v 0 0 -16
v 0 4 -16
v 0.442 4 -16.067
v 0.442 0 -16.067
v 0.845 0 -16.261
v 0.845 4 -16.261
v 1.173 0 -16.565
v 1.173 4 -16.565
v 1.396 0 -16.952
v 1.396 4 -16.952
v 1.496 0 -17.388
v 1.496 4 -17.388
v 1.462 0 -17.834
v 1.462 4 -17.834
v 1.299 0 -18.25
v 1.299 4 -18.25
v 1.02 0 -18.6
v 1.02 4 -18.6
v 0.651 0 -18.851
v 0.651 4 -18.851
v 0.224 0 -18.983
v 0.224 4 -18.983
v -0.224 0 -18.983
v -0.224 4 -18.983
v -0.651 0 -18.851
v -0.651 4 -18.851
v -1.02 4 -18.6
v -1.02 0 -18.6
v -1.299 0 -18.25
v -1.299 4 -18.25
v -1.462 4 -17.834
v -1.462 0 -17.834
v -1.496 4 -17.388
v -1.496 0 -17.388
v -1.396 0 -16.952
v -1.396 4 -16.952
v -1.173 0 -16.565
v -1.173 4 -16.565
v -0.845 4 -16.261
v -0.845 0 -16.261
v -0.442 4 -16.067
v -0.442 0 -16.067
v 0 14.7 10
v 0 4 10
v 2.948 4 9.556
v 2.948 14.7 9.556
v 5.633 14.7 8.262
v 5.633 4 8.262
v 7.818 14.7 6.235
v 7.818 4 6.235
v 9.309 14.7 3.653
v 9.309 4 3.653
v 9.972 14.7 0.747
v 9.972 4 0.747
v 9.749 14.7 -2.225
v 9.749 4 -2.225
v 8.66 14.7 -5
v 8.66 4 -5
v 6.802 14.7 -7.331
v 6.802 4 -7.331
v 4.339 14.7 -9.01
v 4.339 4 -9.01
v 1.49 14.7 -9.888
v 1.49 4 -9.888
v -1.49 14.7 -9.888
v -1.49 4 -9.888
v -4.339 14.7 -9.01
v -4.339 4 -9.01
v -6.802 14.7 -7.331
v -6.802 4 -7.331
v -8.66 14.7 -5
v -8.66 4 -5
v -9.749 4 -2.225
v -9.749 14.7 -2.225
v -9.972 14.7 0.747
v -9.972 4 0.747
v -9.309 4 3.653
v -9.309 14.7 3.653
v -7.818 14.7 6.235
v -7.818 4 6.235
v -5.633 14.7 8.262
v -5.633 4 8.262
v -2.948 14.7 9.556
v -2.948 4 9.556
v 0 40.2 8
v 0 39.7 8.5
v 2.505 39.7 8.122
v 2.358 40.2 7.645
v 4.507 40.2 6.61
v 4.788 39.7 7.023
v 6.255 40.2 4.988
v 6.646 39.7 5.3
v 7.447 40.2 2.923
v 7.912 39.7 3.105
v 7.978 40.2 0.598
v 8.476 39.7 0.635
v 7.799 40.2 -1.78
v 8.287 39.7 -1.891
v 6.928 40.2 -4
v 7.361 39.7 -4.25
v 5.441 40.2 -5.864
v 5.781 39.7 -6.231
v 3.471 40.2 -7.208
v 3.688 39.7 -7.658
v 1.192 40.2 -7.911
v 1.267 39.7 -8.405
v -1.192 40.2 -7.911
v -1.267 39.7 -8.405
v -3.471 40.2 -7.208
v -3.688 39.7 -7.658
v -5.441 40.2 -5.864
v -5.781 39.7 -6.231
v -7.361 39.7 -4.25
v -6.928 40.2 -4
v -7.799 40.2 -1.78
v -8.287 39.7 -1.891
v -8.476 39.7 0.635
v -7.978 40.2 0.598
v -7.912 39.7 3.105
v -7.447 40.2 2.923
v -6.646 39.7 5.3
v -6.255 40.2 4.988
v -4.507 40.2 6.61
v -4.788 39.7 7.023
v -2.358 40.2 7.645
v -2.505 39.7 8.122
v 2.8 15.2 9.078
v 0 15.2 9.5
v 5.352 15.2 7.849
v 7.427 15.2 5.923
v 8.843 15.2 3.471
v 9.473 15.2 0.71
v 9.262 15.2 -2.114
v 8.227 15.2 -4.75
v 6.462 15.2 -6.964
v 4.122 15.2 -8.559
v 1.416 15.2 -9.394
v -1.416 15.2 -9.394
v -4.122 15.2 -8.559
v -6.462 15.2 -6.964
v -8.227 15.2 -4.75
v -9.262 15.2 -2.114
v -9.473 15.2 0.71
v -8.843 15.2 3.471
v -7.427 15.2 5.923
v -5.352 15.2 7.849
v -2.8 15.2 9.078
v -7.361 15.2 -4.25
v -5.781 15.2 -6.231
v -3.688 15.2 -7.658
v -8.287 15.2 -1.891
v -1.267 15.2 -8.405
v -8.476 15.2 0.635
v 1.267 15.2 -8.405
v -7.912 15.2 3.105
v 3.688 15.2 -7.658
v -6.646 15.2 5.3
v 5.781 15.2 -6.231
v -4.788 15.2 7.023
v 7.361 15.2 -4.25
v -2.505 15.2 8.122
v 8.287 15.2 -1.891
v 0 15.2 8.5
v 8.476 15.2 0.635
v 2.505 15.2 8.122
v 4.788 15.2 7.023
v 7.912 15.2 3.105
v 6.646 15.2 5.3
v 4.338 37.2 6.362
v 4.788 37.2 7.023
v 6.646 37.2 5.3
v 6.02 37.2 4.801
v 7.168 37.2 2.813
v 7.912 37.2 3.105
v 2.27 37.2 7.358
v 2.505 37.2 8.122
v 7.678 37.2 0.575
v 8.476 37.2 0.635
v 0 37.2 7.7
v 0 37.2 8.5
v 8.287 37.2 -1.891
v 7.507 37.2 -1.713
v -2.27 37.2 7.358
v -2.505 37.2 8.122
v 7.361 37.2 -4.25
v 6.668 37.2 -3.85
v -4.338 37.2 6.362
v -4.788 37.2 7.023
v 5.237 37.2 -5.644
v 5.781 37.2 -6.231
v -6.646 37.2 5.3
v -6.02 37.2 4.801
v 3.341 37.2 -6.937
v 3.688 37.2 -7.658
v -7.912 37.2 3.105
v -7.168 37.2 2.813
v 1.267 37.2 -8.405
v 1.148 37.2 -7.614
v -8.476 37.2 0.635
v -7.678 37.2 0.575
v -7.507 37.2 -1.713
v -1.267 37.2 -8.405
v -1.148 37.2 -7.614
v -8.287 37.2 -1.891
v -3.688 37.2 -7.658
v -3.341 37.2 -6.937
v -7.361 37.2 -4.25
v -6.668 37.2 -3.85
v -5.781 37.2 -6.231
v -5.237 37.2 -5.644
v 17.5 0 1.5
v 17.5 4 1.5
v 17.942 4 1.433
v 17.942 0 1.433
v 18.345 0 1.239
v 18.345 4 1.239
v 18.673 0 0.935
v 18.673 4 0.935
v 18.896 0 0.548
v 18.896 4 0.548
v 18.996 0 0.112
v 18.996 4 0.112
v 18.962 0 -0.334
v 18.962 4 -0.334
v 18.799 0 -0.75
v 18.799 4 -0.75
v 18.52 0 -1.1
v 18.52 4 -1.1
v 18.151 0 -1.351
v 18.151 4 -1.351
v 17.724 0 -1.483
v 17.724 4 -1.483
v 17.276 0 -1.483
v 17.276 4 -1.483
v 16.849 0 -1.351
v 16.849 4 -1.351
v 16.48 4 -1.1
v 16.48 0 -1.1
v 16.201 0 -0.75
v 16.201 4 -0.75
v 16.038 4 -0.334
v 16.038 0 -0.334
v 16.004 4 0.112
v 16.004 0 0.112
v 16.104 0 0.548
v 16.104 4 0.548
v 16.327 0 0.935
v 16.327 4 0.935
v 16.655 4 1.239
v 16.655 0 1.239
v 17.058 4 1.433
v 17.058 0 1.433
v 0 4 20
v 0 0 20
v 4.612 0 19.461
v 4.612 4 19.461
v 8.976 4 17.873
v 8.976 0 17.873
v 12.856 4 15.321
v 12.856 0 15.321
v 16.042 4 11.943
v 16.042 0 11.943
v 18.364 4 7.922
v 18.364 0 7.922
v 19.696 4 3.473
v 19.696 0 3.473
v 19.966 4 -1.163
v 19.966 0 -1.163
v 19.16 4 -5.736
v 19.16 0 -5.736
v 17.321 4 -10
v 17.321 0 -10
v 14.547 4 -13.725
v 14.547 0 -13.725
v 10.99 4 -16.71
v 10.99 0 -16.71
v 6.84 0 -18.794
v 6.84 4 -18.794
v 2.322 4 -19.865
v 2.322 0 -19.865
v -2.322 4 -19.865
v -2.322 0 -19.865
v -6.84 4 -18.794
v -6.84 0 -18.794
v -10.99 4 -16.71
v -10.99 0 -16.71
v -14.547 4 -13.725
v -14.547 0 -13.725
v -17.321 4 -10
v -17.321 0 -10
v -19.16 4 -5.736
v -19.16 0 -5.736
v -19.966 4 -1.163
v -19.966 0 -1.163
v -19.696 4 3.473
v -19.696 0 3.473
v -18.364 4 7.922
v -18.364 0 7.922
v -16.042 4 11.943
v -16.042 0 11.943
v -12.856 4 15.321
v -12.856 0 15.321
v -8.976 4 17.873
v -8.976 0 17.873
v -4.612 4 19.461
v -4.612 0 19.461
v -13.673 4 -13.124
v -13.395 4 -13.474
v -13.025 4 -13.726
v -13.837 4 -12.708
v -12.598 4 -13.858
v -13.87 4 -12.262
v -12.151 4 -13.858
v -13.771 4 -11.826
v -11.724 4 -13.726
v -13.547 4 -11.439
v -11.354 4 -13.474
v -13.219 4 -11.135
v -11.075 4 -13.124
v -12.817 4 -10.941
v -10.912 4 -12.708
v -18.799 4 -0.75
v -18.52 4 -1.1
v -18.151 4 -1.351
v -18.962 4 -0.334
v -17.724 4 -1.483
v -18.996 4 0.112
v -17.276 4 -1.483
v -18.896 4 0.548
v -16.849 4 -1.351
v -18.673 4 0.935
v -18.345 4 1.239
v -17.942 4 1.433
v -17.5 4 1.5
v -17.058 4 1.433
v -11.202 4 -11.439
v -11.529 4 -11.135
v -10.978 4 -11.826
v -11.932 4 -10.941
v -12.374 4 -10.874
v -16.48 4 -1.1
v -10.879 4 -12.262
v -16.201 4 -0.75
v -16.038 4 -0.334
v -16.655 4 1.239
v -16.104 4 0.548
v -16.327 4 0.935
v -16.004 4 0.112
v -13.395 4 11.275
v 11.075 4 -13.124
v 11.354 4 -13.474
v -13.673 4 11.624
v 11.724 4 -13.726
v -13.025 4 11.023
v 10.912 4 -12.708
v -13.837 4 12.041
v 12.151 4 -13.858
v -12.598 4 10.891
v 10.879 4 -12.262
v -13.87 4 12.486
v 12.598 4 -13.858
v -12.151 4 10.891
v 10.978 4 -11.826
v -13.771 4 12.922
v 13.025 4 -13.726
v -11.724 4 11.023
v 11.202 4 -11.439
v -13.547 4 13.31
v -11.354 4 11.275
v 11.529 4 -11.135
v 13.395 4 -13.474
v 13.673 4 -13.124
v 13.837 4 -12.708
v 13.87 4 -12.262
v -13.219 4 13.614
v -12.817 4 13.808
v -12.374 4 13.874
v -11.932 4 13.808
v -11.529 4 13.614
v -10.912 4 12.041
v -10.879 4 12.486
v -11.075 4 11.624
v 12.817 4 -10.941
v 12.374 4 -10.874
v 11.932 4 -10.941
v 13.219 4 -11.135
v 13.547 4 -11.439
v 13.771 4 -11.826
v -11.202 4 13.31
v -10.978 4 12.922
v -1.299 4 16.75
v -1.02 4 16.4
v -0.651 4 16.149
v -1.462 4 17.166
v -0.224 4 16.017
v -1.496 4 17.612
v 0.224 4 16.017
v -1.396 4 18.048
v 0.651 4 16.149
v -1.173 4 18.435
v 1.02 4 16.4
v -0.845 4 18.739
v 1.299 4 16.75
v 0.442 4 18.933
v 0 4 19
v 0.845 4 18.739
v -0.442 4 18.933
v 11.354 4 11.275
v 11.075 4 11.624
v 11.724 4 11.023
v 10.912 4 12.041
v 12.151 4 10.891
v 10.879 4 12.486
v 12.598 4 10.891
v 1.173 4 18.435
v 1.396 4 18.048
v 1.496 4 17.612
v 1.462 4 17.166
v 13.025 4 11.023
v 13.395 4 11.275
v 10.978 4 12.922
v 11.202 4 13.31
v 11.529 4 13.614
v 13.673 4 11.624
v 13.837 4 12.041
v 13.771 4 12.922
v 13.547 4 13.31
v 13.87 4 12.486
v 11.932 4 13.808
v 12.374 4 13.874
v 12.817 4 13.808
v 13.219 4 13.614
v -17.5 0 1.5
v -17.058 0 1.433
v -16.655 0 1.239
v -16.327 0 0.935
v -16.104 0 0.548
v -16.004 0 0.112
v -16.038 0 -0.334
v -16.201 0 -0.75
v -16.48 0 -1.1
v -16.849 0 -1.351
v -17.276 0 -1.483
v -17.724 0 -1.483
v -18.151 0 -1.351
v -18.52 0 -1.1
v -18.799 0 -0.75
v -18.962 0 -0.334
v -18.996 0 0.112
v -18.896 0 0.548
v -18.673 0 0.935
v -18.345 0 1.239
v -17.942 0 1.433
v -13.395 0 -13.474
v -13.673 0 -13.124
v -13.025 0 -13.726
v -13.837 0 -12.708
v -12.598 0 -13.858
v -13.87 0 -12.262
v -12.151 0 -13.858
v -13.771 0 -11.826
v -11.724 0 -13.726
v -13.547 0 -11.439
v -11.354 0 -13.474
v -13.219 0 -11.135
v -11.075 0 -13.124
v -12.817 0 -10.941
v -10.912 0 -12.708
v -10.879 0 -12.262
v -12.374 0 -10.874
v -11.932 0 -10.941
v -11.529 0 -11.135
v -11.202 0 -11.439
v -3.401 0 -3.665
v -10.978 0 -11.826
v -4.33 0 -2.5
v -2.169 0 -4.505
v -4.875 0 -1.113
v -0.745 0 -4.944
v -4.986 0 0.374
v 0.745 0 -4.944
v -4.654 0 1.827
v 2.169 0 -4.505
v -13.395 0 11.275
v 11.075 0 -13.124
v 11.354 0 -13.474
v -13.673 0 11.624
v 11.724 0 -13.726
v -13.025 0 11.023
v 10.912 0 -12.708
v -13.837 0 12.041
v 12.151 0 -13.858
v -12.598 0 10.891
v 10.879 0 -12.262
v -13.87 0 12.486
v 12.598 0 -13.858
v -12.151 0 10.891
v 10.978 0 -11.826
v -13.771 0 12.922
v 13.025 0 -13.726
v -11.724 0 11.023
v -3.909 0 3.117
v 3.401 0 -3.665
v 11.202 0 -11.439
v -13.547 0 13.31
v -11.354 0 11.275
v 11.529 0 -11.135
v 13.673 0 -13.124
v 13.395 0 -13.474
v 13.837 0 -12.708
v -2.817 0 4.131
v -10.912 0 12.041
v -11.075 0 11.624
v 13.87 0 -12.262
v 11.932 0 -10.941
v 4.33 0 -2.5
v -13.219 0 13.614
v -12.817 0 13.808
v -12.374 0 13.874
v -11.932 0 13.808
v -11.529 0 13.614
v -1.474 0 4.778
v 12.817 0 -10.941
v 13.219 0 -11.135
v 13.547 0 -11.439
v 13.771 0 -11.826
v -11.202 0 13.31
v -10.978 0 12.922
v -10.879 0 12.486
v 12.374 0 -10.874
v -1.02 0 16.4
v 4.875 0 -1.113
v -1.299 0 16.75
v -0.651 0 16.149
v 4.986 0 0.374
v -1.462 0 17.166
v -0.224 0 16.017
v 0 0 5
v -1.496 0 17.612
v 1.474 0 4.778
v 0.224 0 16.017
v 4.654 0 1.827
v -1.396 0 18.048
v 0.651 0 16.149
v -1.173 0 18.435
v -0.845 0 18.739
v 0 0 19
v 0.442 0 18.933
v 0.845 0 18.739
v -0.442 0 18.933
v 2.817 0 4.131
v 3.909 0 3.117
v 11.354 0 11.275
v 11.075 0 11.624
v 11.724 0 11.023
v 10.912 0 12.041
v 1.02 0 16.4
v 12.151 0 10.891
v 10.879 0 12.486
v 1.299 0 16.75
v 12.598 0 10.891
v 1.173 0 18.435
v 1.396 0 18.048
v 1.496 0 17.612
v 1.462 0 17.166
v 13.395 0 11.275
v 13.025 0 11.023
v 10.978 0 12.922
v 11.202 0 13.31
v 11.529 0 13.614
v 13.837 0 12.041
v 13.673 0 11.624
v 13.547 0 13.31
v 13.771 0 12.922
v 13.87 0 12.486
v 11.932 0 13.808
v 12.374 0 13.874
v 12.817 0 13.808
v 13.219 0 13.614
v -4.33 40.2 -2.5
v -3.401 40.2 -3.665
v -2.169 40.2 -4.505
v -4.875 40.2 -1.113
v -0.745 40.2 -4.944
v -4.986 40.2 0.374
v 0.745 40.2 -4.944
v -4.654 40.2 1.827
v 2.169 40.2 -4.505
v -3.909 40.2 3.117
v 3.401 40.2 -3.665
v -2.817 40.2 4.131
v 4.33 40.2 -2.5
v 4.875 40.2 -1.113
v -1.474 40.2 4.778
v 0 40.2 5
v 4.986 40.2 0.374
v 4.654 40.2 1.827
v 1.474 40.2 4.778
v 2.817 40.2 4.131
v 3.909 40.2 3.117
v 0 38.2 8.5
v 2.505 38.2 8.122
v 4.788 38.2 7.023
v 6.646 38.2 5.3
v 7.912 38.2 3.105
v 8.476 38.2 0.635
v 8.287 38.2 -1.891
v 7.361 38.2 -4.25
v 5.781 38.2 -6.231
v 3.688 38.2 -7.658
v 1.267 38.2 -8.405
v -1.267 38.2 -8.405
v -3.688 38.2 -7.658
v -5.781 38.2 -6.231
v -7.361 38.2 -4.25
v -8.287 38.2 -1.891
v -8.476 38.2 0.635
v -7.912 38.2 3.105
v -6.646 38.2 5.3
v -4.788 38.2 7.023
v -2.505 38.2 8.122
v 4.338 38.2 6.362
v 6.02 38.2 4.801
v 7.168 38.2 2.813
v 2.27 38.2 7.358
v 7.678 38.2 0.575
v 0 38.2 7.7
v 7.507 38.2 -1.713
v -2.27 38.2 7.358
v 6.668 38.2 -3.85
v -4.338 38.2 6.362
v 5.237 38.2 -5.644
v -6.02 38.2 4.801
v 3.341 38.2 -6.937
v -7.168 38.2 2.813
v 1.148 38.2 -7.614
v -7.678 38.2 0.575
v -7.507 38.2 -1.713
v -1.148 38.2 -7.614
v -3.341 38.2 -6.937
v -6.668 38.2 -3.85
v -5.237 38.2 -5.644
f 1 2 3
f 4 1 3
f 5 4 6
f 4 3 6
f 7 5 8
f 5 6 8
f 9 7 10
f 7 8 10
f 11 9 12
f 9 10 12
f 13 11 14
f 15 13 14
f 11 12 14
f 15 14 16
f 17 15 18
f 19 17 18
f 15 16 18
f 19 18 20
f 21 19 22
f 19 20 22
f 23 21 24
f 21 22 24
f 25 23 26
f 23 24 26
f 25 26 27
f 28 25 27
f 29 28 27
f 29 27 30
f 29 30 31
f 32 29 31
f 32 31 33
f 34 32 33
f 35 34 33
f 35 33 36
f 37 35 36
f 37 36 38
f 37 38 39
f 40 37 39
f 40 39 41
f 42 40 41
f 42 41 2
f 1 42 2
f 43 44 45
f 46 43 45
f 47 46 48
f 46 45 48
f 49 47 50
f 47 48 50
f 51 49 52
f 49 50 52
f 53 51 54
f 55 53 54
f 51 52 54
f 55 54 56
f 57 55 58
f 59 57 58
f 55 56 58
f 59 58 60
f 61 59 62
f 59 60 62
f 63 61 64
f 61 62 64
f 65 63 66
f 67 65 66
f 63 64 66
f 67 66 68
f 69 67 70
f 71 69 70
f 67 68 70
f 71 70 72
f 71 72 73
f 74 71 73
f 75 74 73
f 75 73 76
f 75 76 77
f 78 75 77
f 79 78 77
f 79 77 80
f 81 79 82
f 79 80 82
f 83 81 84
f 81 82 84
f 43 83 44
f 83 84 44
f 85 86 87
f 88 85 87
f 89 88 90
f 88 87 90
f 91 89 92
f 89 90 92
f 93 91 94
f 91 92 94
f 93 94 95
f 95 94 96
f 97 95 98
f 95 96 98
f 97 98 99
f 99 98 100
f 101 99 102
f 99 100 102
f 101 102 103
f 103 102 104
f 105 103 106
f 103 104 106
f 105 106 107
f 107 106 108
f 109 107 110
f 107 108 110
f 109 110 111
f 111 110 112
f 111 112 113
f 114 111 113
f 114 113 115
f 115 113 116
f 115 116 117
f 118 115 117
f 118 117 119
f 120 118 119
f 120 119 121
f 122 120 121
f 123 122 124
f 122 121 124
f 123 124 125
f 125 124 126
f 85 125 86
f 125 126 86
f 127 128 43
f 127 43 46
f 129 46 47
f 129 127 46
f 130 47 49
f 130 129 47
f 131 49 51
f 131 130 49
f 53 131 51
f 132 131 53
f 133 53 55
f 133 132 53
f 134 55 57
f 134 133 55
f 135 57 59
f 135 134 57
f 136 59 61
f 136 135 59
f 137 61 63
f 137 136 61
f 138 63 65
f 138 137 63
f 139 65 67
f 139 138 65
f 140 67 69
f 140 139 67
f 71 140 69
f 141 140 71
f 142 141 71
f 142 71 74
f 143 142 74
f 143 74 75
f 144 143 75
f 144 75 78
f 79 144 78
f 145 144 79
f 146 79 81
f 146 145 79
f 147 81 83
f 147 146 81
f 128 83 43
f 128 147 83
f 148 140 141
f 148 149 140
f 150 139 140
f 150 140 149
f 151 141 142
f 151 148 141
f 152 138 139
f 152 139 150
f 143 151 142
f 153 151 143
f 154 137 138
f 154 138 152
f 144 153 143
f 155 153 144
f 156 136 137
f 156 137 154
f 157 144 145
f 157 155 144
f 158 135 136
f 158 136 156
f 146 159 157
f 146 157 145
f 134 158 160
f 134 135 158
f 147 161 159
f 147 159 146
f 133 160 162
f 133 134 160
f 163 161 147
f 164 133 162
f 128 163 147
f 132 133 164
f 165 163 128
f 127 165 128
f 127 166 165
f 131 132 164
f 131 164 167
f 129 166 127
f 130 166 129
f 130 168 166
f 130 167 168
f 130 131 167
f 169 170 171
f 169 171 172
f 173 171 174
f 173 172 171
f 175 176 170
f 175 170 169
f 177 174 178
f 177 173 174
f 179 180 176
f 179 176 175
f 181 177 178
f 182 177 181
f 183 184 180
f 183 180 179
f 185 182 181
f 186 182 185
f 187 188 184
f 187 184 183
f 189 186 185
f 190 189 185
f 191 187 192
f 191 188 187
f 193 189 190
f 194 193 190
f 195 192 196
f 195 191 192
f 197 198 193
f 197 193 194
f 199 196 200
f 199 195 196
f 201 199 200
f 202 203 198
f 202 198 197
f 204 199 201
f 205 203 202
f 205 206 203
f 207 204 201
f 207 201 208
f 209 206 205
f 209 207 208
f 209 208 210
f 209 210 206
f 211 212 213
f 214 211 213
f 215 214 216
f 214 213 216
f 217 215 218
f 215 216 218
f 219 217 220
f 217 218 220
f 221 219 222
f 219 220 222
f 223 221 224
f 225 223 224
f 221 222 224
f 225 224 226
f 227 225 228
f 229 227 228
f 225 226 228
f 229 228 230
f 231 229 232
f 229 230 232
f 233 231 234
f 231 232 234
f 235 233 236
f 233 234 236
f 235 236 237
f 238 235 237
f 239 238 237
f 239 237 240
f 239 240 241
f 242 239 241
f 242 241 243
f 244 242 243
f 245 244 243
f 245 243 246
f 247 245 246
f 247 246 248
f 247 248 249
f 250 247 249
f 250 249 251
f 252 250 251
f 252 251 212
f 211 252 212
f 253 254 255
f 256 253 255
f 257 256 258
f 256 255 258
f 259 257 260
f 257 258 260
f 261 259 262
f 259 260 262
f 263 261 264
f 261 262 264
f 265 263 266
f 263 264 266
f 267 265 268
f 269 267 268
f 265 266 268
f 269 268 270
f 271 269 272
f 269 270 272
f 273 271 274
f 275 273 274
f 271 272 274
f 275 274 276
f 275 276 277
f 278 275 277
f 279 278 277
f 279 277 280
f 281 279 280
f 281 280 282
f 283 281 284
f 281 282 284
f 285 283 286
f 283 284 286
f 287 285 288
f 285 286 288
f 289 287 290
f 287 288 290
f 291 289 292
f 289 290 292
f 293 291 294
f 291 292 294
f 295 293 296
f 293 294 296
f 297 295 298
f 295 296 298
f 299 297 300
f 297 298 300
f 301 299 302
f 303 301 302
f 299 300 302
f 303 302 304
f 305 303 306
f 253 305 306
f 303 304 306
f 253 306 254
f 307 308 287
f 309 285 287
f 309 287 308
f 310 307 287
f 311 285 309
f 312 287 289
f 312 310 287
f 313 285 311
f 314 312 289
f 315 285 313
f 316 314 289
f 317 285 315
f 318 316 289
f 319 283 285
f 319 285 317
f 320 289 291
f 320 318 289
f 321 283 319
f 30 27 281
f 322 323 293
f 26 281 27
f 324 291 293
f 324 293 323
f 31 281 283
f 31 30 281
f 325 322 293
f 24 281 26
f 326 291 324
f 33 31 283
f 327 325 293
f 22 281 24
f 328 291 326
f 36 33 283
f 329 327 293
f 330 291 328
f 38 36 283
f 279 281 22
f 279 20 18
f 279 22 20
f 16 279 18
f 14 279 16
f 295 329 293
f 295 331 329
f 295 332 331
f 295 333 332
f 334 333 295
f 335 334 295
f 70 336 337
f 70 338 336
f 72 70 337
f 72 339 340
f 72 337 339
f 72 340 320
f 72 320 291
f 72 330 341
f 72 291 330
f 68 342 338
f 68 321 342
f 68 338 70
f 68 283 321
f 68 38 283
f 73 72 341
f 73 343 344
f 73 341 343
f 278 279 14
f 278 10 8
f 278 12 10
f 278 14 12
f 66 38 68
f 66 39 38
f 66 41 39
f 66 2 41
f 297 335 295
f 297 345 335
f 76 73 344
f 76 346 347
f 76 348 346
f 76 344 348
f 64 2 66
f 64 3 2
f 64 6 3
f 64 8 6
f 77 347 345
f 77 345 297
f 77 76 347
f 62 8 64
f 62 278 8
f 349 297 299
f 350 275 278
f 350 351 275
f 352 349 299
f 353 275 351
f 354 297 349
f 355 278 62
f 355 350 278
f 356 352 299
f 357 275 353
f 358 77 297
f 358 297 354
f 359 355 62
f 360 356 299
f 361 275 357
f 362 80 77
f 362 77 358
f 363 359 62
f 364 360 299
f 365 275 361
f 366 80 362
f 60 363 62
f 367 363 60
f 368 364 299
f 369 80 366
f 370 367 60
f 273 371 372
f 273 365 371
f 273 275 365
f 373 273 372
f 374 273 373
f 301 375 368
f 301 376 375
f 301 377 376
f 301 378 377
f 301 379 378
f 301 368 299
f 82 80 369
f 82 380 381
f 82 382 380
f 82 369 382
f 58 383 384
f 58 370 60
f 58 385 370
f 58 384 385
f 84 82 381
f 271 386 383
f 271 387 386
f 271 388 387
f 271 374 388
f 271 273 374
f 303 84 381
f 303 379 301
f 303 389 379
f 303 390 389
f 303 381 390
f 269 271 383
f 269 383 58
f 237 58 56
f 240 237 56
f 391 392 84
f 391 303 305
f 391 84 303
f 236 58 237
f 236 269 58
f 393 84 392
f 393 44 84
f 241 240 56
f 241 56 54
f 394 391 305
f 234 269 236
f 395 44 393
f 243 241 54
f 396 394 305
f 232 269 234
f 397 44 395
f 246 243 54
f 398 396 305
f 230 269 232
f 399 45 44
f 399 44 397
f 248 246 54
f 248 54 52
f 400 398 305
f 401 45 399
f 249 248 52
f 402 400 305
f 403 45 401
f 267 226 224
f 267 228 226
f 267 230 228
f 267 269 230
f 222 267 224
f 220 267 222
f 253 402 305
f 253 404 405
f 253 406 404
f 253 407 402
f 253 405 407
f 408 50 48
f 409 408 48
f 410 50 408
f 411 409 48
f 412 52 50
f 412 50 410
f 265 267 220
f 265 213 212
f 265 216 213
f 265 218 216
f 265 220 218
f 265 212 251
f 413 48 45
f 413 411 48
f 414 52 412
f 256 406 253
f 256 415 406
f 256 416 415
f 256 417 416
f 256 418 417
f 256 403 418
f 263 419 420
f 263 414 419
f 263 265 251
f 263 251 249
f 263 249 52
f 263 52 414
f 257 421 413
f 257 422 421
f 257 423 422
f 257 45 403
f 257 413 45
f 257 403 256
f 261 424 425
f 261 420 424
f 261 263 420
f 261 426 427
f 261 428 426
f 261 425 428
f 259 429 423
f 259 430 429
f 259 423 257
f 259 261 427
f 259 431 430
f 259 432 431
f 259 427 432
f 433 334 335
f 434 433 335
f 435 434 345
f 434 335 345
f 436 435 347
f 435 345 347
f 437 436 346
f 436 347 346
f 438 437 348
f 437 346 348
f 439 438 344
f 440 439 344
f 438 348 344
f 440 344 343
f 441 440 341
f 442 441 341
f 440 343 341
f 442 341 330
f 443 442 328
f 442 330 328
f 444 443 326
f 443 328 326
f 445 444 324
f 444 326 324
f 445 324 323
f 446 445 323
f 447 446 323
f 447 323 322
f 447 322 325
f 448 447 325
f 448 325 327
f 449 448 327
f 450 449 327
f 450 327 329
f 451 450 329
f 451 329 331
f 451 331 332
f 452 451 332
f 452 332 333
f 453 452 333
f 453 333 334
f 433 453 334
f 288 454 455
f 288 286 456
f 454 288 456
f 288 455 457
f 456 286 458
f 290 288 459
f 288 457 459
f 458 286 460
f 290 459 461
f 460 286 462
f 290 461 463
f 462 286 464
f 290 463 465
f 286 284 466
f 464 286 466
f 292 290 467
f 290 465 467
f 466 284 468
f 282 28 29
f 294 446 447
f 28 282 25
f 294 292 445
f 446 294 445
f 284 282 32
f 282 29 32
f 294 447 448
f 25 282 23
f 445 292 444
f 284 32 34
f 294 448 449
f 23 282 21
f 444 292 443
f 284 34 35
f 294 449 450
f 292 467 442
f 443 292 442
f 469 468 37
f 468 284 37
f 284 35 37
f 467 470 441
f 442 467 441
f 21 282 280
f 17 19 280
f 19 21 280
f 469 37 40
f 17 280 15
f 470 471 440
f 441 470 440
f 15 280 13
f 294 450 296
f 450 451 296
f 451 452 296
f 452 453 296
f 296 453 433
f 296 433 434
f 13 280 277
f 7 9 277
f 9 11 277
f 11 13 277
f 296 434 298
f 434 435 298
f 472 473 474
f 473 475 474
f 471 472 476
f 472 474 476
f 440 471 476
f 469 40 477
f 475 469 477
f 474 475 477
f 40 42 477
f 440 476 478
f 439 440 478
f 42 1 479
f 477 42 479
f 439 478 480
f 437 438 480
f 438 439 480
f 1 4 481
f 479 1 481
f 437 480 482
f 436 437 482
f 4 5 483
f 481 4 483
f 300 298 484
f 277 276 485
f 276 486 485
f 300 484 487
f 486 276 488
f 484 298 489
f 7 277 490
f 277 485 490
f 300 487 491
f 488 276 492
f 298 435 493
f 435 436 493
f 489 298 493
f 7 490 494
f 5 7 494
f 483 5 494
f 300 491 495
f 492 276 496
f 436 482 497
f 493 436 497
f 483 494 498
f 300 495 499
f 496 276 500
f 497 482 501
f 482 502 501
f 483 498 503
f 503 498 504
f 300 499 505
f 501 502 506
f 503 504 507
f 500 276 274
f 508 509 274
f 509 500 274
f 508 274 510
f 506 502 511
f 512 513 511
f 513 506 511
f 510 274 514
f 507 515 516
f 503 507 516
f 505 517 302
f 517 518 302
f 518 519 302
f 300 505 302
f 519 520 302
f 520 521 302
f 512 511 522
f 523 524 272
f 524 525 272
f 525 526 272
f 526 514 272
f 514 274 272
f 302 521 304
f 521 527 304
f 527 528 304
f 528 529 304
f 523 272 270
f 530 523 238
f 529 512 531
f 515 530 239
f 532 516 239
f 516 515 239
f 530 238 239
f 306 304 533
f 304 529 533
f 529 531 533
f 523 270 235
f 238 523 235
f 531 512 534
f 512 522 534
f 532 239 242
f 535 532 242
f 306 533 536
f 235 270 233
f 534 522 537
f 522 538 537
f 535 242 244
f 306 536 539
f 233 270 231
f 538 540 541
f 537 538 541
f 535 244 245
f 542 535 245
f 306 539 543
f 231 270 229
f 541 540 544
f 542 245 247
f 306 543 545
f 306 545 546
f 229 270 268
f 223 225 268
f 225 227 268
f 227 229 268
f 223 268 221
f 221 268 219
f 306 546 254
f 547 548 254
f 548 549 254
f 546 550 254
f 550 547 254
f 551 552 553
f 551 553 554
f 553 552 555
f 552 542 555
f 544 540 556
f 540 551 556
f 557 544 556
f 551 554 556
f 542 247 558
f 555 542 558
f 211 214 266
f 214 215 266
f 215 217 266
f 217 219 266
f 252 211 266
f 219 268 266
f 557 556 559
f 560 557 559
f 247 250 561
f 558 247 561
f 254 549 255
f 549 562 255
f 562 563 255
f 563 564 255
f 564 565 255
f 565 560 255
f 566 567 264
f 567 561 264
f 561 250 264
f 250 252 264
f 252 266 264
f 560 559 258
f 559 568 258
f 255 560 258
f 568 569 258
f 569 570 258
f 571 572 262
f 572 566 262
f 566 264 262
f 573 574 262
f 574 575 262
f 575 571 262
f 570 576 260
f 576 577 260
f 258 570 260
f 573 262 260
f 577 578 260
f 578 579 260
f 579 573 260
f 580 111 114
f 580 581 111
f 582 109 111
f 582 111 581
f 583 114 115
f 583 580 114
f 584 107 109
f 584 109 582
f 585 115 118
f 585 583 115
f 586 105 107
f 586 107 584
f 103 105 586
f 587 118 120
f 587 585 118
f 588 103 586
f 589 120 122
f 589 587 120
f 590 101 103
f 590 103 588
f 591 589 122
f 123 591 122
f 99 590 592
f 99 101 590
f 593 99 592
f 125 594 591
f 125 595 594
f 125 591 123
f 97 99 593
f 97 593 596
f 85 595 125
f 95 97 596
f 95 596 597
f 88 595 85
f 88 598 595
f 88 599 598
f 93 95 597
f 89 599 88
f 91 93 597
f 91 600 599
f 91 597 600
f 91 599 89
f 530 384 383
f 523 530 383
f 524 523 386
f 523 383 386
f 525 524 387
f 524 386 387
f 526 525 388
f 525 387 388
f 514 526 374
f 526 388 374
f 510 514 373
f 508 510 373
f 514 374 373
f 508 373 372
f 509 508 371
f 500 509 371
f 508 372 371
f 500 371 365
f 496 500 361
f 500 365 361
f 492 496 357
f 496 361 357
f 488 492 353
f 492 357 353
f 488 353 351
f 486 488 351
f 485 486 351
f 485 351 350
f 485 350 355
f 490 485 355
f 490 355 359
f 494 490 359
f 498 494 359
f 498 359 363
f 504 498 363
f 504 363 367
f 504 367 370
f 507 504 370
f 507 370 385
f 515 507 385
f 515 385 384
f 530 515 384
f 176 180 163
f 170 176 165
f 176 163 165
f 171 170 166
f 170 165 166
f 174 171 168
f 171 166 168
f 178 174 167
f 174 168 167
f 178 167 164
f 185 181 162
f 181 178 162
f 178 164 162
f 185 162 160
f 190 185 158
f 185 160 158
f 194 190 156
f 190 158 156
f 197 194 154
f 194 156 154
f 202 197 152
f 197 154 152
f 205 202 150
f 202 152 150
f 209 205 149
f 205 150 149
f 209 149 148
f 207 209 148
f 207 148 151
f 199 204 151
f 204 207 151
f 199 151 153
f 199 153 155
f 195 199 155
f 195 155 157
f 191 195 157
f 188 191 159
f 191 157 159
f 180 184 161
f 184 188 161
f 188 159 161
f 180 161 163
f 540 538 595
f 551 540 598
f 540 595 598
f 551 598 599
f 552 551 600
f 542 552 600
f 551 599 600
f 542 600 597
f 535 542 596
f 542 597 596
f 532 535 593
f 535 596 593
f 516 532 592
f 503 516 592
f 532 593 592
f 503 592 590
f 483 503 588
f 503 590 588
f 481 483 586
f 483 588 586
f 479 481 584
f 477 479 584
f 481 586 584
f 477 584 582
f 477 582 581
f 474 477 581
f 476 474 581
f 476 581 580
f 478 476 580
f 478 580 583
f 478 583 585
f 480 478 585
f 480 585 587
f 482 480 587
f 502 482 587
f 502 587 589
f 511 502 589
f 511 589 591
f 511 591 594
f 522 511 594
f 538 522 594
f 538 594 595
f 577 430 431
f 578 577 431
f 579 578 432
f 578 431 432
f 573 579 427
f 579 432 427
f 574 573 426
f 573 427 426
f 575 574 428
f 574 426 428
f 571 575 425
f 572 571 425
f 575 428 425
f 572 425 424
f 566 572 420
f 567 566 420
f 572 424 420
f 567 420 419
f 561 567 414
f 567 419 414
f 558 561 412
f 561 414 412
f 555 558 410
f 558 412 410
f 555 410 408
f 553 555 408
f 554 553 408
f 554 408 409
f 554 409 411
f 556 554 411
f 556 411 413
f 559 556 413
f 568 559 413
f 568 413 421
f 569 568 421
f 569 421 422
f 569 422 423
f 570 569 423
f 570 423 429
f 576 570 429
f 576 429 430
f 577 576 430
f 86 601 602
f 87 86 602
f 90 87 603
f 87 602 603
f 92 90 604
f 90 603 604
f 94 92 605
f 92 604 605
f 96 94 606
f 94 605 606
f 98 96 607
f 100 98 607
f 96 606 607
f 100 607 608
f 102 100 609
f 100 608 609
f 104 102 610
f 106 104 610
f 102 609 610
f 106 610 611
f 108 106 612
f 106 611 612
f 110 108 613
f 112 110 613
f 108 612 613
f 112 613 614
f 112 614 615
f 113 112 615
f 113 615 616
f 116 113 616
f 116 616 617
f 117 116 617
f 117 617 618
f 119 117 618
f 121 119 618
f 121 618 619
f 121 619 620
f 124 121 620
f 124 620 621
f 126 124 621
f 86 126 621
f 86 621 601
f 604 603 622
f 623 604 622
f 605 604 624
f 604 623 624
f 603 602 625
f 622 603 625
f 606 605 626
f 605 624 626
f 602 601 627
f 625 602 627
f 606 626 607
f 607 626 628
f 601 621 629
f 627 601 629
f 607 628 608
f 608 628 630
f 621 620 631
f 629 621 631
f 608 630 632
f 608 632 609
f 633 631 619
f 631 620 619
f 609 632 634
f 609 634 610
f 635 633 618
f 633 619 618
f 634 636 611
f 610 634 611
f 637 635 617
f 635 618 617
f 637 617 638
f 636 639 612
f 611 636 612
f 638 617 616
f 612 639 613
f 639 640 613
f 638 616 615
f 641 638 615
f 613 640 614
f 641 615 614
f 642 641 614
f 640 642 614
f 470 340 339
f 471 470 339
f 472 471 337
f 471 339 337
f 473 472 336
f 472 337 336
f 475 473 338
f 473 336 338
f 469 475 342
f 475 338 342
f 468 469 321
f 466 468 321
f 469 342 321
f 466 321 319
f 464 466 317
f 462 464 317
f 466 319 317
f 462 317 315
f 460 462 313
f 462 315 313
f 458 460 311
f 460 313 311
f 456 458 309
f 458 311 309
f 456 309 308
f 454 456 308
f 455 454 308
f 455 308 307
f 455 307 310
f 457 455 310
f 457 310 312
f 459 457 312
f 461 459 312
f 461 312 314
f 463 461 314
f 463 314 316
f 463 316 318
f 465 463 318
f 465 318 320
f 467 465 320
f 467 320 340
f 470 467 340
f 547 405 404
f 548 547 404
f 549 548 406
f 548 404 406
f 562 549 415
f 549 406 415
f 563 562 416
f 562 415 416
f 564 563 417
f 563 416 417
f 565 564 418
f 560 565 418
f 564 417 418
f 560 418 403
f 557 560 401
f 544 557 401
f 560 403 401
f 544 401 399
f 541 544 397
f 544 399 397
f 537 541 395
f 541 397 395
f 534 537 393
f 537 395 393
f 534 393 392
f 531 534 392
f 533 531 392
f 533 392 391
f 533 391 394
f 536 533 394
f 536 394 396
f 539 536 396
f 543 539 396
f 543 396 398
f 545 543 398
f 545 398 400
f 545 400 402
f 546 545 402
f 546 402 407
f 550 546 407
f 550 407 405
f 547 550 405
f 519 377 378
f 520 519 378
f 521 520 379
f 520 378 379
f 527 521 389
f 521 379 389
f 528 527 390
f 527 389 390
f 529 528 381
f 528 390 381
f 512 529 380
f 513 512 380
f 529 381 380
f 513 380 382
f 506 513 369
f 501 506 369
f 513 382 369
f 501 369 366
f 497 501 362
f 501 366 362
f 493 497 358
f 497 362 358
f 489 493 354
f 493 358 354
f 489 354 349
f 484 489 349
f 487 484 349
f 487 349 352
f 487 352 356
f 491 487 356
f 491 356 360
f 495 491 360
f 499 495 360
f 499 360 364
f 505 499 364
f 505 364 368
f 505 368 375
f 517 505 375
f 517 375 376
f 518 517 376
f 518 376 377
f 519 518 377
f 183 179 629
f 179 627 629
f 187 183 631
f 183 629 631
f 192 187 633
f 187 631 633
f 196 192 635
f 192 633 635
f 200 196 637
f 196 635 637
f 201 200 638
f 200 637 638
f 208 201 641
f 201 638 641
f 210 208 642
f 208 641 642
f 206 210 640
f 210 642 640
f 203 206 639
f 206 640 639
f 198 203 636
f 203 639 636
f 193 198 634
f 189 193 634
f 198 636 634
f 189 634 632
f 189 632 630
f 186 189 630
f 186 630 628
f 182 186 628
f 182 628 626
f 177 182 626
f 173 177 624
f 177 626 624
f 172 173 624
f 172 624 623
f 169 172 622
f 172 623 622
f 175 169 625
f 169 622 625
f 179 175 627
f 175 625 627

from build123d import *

# Parameters (mm, degrees)
SKETCH_1_R          = 20
EXTRUDE_1_DEPTH     = 4
SKETCH_2_R          = 10
EXTRUDE_2_DEPTH     = 11.2
SKETCH_3_R          = 1.5
CUT_EXTRUDE_1_DEPTH = 31.421045347
SKETCH_4_R          = 8.5
EXTRUDE_3_DEPTH     = 25
SKETCH_5_R          = 5
CUT_EXTRUDE_2_DEPTH = 50.153229802
SKETCH_6_W          = 0.8
SKETCH_6_H          = 1
CHAMFER_1_SIZE      = 0.5


with BuildPart() as part:
    # 草图1 → 凸台-拉伸1 (new body)
    with BuildSketch(Plane(origin=(0, 0, 0), x_dir=(1, 0, 0), z_dir=(0, 1, 0))):
        with Locations(Location((0, 0, 0), (0, 0, 270))):
            Circle(SKETCH_1_R)
    extrude(amount=EXTRUDE_1_DEPTH)

    # 草图2 → 凸台-拉伸2 (add)
    with BuildSketch(Plane(origin=(0, 4, 0), x_dir=(1, 0, 0), z_dir=(0, 1, 0))):
        with Locations(Location((0, 0, 0), (0, 0, 270))):
            Circle(SKETCH_2_R)
    extrude(amount=EXTRUDE_2_DEPTH)

    # 草图3 → 切除-拉伸1 (cut, through all)
    with BuildSketch(Plane(origin=(0, 4, 0), x_dir=(1, 0, 0), z_dir=(0, 1, 0))):
        with Locations(Location((0, 17.5, 0), (0, 0, 270))):
            Circle(SKETCH_3_R)
        with Locations(Location((12.374368671, 12.374368671, 0), (0, 0, 270))):
            Circle(SKETCH_3_R)
        with Locations(Location((17.5, 0, 0), (0, 0, 270))):
            Circle(SKETCH_3_R)
        with Locations(Location((12.374368671, -12.374368671, 0), (0, 0, 270))):
            Circle(SKETCH_3_R)
        with Locations(Location((0, -17.5, 0), (0, 0, 270))):
            Circle(SKETCH_3_R)
        with Locations(Location((-12.374368671, -12.374368671, 0), (0, 0, 270))):
            Circle(SKETCH_3_R)
        with Locations(Location((-17.5, 0, 0), (0, 0, 270))):
            Circle(SKETCH_3_R)
        with Locations(Location((-12.374368671, 12.374368671, 0), (0, 0, 270))):
            Circle(SKETCH_3_R)
    extrude(amount=-CUT_EXTRUDE_1_DEPTH, mode=Mode.SUBTRACT)

    # 草图4 → 凸台-拉伸3 (add)
    with BuildSketch(Plane(origin=(0, 15.2, 0), x_dir=(1, 0, 0), z_dir=(0, 1, 0))):
        with Locations(Location((0, 0, 0), (0, 0, 270))):
            Circle(SKETCH_4_R)
    extrude(amount=EXTRUDE_3_DEPTH)

    # 草图5 → 切除-拉伸2 (cut, through all)
    with BuildSketch(Plane(origin=(0, 40.2, 0), x_dir=(1, 0, 0), z_dir=(0, 1, 0))):
        with Locations(Location((0, 0, 0), (0, 0, 270))):
            Circle(SKETCH_5_R)
    extrude(amount=-CUT_EXTRUDE_2_DEPTH, mode=Mode.SUBTRACT)

    # 草图6 → 切除-旋转1 (revolve, cut)
    with BuildSketch(Plane.XY, mode=Mode.PRIVATE) as cut_revolve_1_sk:
        with Locations((8.1, 37.7)):
            Rectangle(SKETCH_6_W, SKETCH_6_H)
    revolve(cut_revolve_1_sk.sketch.rotate(Axis((0, 40.2, 0), (0, -1, 0)), 90), axis=Axis((0, 40.2, 0), (0, -1, 0)), mode=Mode.SUBTRACT)

    # 倒角1
    chamfer_1_edges = [part.edges().sort_by_distance(p)[0] for p in [
        (0, 40.2, -8.5),
        (0, 15.2, -10),
    ]]
    chamfer(chamfer_1_edges, length=CHAMFER_1_SIZE)


solid = part.part
